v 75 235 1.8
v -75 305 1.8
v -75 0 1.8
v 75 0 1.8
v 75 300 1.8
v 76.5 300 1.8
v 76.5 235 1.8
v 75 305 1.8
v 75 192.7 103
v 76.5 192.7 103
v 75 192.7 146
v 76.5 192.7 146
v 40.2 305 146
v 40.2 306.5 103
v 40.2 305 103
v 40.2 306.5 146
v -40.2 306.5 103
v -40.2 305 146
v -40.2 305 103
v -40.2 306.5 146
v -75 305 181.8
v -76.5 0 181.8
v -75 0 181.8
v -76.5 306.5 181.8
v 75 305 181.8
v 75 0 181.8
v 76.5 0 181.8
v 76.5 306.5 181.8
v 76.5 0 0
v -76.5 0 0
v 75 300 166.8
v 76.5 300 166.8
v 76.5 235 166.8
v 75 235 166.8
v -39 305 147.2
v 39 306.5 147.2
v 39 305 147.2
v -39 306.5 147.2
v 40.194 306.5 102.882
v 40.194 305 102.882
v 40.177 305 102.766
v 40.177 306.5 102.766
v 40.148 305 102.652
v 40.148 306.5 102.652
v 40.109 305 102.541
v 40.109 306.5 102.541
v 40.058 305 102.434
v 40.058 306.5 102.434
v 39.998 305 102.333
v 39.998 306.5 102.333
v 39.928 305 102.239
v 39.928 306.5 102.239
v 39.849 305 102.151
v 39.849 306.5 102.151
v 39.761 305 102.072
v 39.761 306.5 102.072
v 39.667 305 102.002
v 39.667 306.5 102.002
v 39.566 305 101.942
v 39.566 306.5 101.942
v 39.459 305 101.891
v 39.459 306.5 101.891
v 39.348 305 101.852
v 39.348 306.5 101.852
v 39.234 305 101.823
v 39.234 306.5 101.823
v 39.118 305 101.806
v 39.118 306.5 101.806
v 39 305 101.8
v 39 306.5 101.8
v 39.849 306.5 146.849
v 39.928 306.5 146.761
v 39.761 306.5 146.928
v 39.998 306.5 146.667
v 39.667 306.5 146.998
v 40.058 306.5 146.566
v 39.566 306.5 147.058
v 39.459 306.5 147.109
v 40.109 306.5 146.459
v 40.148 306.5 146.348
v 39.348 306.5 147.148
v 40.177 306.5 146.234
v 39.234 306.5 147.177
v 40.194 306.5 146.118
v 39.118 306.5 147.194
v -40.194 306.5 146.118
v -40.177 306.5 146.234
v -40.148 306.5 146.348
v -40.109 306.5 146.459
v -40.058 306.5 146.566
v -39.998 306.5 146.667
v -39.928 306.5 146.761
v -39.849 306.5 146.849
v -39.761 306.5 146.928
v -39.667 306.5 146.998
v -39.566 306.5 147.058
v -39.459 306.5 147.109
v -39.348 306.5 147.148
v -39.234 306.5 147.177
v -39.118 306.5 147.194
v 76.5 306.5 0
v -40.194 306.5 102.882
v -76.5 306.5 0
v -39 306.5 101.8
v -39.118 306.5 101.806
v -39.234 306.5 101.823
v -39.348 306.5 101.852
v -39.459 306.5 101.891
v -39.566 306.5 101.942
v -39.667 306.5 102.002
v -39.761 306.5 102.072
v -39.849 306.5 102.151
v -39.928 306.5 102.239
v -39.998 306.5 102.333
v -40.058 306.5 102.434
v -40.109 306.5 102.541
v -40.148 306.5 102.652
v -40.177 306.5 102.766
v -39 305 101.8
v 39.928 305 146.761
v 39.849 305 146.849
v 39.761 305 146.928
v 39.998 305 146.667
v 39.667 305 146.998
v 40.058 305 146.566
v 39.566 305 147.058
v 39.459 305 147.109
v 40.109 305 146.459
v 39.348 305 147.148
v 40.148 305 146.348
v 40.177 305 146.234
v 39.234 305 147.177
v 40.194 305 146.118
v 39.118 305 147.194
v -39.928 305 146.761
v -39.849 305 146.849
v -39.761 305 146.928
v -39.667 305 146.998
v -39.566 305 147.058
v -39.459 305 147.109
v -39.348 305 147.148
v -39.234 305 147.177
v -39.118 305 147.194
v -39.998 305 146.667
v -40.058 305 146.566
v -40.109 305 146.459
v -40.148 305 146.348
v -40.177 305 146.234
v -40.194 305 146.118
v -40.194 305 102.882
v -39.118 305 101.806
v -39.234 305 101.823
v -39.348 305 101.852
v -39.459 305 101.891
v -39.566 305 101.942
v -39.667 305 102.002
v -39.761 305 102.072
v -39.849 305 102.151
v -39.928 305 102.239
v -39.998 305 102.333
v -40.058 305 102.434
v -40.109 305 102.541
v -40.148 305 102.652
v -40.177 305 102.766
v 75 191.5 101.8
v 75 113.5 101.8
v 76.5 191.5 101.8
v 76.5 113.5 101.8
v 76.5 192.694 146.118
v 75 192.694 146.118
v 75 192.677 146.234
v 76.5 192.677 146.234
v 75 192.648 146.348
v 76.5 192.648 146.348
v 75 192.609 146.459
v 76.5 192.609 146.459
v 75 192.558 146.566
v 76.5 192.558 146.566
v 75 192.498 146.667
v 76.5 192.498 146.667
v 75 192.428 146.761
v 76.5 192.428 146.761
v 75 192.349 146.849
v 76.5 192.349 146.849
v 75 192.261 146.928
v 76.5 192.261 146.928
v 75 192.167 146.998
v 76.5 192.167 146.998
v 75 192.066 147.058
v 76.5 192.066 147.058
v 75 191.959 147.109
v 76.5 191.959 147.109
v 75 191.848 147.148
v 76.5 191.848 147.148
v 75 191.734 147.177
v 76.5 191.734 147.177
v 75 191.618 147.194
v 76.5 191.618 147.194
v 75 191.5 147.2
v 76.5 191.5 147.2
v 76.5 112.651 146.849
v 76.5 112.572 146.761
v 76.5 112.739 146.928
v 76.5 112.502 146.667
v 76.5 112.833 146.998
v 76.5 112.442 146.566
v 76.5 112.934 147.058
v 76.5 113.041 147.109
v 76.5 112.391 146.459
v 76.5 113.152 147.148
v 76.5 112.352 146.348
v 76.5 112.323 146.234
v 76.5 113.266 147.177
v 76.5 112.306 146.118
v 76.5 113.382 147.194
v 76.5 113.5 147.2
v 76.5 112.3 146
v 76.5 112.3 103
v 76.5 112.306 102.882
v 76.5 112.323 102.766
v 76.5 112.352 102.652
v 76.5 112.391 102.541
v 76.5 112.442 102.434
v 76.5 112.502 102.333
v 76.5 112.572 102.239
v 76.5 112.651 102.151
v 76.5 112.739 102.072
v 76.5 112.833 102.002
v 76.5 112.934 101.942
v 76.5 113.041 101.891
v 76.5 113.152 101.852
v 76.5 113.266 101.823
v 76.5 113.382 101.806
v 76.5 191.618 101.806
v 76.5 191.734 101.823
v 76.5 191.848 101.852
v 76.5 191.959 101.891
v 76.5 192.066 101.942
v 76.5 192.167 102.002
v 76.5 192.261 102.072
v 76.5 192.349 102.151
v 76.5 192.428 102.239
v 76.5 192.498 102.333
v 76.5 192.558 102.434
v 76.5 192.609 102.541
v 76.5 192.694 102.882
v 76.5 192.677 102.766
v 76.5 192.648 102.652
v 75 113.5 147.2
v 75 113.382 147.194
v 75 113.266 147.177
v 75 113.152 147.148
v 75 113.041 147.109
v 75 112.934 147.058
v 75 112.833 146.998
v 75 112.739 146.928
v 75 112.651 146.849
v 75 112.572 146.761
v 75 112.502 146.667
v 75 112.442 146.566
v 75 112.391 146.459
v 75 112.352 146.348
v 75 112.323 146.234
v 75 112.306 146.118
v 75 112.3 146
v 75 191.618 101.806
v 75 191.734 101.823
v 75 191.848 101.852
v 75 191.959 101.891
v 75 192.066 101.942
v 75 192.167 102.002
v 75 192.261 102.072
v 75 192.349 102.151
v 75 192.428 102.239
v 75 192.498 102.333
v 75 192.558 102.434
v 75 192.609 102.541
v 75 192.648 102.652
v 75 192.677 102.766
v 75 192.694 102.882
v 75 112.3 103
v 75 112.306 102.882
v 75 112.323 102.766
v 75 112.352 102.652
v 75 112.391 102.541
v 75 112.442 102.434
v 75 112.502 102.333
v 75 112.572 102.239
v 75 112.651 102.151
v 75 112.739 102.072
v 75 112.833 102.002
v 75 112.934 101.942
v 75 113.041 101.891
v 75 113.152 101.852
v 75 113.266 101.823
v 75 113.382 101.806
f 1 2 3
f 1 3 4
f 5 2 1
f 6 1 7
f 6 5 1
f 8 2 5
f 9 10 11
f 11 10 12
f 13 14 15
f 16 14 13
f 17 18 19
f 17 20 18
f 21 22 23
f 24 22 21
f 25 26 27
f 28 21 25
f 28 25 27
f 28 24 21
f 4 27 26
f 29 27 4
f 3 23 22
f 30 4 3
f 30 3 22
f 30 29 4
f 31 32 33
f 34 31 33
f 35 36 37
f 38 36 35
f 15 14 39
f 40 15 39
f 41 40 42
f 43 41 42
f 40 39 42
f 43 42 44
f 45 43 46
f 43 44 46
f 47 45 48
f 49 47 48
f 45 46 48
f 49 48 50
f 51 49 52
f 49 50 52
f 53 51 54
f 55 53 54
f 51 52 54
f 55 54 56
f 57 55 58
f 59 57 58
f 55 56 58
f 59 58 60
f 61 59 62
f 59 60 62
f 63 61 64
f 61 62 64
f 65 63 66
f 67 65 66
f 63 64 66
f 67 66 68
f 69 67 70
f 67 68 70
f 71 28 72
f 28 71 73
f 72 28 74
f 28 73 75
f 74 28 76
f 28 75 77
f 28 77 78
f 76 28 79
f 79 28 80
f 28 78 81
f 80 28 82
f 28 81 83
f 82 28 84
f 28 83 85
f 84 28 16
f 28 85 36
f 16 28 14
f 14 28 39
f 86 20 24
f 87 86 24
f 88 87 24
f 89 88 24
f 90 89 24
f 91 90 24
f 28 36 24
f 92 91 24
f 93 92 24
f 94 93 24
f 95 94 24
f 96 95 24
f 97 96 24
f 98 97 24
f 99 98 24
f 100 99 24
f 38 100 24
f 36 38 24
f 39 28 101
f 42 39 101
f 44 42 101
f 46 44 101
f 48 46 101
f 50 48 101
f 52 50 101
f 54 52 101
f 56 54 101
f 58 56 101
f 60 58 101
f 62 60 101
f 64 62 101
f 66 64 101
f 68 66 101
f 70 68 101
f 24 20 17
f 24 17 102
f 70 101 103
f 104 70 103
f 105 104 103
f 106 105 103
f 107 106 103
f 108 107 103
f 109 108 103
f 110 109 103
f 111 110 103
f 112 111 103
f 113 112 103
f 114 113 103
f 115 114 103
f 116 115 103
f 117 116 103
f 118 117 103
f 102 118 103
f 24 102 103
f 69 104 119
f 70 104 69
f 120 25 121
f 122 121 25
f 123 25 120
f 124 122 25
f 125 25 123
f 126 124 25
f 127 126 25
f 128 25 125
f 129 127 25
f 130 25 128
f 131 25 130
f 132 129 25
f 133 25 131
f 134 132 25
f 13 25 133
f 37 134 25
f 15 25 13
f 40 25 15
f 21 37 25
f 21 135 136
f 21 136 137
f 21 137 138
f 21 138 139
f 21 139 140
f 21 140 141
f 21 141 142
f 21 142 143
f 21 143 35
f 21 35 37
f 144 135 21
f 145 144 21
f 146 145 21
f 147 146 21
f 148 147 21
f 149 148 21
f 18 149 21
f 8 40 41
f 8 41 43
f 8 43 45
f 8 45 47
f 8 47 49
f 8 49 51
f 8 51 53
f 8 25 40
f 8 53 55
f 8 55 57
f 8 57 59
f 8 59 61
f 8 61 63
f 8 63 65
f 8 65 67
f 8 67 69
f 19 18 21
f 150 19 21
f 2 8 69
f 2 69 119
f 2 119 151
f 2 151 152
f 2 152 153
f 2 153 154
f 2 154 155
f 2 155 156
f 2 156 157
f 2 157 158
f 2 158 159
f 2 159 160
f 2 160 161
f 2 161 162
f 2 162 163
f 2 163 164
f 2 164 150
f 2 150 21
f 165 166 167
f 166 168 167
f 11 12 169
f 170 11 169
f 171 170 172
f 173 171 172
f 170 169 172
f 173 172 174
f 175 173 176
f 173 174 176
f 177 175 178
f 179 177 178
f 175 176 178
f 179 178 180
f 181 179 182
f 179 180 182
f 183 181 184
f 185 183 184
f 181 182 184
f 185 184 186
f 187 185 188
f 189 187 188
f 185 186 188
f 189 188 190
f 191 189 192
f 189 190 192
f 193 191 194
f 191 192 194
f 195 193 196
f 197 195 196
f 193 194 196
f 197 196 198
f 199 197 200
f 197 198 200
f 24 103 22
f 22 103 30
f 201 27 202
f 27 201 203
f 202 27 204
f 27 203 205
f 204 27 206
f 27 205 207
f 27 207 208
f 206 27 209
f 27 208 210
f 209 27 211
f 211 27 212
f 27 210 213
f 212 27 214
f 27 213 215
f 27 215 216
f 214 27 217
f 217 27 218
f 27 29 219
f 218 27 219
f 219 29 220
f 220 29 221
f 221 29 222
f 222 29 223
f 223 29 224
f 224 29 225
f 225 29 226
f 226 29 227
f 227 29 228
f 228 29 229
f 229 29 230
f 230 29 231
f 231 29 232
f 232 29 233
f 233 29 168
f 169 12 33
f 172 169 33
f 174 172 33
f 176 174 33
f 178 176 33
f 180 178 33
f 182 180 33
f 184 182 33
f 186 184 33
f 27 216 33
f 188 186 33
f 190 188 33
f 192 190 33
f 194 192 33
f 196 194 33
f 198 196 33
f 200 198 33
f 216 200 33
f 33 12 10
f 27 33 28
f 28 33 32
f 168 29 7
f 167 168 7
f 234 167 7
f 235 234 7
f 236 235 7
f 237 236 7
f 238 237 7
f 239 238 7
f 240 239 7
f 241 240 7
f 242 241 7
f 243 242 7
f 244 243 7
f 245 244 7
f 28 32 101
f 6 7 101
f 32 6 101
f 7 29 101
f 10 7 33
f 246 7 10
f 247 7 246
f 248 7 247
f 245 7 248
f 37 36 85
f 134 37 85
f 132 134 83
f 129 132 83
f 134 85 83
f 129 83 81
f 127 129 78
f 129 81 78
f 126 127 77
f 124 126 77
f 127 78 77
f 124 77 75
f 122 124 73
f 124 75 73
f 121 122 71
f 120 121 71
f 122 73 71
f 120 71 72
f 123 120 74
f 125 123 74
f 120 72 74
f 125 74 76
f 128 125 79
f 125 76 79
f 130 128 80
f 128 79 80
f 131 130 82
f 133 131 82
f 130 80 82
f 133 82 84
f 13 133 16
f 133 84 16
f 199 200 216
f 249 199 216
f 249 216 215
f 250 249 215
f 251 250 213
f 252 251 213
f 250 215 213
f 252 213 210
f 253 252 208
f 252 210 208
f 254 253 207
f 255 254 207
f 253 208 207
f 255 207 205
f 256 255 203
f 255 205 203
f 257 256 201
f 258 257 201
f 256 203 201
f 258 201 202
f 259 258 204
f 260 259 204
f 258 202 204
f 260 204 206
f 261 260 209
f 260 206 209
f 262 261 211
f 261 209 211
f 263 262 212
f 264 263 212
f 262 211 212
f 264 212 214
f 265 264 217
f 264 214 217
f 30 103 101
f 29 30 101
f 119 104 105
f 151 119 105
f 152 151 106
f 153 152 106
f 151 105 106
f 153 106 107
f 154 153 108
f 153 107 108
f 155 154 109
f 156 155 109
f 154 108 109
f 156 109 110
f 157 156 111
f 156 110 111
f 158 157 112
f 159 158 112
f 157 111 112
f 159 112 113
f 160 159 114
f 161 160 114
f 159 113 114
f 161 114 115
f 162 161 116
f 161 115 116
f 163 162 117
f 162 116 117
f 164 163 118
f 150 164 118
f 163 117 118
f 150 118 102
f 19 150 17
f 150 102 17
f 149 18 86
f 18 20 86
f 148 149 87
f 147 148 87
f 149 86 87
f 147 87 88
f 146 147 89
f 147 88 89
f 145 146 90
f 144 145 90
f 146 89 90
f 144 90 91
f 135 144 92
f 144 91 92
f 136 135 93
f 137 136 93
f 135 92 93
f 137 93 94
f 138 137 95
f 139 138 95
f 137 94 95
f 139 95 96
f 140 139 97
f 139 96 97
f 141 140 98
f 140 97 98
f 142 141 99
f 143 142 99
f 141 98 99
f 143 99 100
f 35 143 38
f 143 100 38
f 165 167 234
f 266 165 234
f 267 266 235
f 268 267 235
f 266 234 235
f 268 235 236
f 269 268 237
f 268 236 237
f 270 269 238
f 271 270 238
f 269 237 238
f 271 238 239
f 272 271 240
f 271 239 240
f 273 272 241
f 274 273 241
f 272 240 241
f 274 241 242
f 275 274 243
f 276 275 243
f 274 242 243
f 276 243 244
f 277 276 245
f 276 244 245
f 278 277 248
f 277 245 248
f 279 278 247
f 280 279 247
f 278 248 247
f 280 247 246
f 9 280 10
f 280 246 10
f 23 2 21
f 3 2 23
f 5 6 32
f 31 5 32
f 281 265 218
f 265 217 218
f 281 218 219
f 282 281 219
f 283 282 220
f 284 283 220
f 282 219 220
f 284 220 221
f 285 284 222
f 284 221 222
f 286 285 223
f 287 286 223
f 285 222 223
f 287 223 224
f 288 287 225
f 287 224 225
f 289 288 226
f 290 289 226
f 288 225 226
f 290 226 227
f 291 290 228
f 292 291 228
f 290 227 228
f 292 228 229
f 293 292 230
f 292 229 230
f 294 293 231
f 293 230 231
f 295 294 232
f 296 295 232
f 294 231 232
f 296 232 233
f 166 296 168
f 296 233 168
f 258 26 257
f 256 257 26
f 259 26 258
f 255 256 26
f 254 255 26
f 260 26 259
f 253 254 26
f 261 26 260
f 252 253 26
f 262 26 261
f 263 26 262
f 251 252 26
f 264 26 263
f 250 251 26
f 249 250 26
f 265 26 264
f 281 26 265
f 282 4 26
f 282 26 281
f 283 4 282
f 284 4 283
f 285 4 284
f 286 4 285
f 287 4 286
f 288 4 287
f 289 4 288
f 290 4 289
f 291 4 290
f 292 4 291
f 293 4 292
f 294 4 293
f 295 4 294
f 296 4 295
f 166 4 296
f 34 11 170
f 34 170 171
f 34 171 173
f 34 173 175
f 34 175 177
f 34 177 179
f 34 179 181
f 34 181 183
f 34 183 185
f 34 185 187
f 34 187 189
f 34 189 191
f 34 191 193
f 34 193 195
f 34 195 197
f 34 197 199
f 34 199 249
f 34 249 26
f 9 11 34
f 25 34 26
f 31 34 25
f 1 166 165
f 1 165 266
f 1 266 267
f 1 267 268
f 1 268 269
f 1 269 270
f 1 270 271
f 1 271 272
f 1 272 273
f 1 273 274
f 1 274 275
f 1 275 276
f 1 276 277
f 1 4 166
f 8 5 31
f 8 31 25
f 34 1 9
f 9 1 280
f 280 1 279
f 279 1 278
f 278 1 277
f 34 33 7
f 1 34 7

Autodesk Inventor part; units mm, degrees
ref_plane "YZ Plane" through (0, 0, 0) normal (1, 0, 0) x (0, 1, 0)
ref_plane "XZ Plane" through (0, 0, 0) normal (0, 1, 0) x (-1, 0, 0)
ref_plane "XY Plane" through (0, 0, 0) normal (0, 0, 1) x (1, 0, 0)
sketch "Skizze1" plane through (0, 0, 0) normal (0, 0, 1) x (1, 0, 0)
  line L0 (-76.5, 0) -> (76.5, 0)
  line L1 (76.5, 0) -> (76.5, 306.5)
  line L2 (76.5, 306.5) -> (-76.5, 306.5)
  line L3 (-76.5, 306.5) -> (-76.5, 0)
  line L4 (75, 306.5) -> (75, 0) construction
  line L5 (-75, 0) -> (-75, 306.5) construction
  line L6 (-76.5, 305) -> (76.5, 305) construction
  point P0 (0, 0)
  point P1 (0, 0)
  point P2 (-75, 305)
  point P3 (75, 305)
  dimension "d2" = 1.5
  dimension "d3" = 1.5
  dimension "d4" = 1.5
  dimension "d5" = 150
  dimension "d6" = 305
extrude "Bodenplatte" add sketch "Skizze1" along normal blind 1.8
sketch "Skizze3" plane through (0, 0, 1.8) normal (0, 0, 1) x (1, 0, 0)
  line L0 (-76.5, 306.5) -> (-76.5, 0) projected
  line L1 (-76.5, 0) -> (76.5, 0) projected
  line L2 (-76.5, 306.5) -> (-75, 306.5)
  line L3 (-75, 306.5) -> (-75, 0)
  line L4 (-75, 0) -> (-76.5, 0)
  line L5 (-76.5, 0) -> (-76.5, 306.5)
  point P0 (0, 0)
  dimension "d9" = 1.5
extrude "Wand_links" add sketch "Skizze3" along normal blind 180
sketch "Skizze4" plane through (0, 0, 1.8) normal (0, 0, 1) x (1, 0, 0)
  line L0 (76.5, 0) -> (76.5, 306.5) projected
  line L1 (76.5, 0) -> (75, 0)
  line L2 (75, 0) -> (75, 306.5)
  line L3 (75, 306.5) -> (76.5, 306.5)
  line L4 (76.5, 306.5) -> (76.5, 0)
  point P0 (0, 0)
  dimension "d12" = 1.5
extrude "Wand_rechts" add sketch "Skizze4" along normal blind 180
sketch "Skizze5" plane through (0, 0, 1.8) normal (0, 0, 1) x (1, 0, 0)
  line L0 (75, 306.5) -> (-75, 306.5) projected
  line L1 (75, 306.5) -> (75, 0) projected
  line L2 (-75, 0) -> (-75, 306.5) projected
  line L3 (-75, 306.5) -> (-76.5, 306.5) projected
  line L4 (-75, 306.5) -> (75, 306.5)
  line L5 (75, 306.5) -> (75, 305)
  line L6 (75, 305) -> (-75, 305)
  line L7 (-75, 305) -> (-75, 306.5)
  point P0 (0, 0)
  dimension "d15" = 1.5
extrude "Wand_vorn" add sketch "Skizze5" along normal blind 180
sketch "Skizze6" plane through (-76.5, 306.5, 0) normal (0, 1, 0) x (1, 0, 0)
  line L0 (153, 0) -> (0, 0) construction
  line L1 (0, 0) -> (0, -181.8) construction
  line L2 (153, -181.8) -> (0, -181.8) construction
  line L3 (153, 0) -> (153, -181.8) construction
  line L4 (115.5, -147.2) -> (37.5, -147.2)
  line L5 (36.3, -146) -> (36.3, -103)
  line L6 (37.5, -101.8) -> (115.5, -101.8)
  line L7 (116.7, -103) -> (116.7, -146)
  line L8 (76.5, 0) -> (76.5, -181.8) construction
  line L9 (153, 0) -> (153, -181.8) construction
  line L10 (151.5, -1.8) -> (1.5, -1.8) construction
  arc A0 (115.5, -147.2) -> (116.7, -146) centre (115.5, -146) ccw
  arc A1 (36.3, -146) -> (37.5, -147.2) centre (37.5, -146) ccw
  arc A2 (37.5, -101.8) -> (36.3, -103) centre (37.5, -103) ccw
  arc A3 (116.7, -103) -> (115.5, -101.8) centre (115.5, -103) ccw
  point P0 (116.7, -147.2)
  point P1 (36.3, -101.8)
  point P2 (36.3, -147.2)
  point P3 (116.7, -101.8)
  point P4 (76.5, -147.2)
  dimension "d18" = 80.4
  dimension "d19" = 45.4
  dimension "d25" = 100
  dimension "d35" = 1.2
extrude "Fenster_vorn" cut sketch "Skizze6" against normal up to next
sketch "Skizze7" plane through (76.5, 0, 0) normal (1, 0, 0) x (0, 0, -1)
  line L0 (-1.8, 0) -> (-1.8, 305) construction
  line L1 (-181.8, 305) -> (-1.8, 305) construction
  line L2 (-146, 112.3) -> (-103, 112.3)
  line L3 (-101.8, 113.5) -> (-101.8, 191.5)
  line L4 (-103, 192.7) -> (-146, 192.7)
  line L5 (-147.2, 191.5) -> (-147.2, 113.5)
  arc A0 (-147.2, 113.5) -> (-146, 112.3) centre (-146, 113.5) ccw
  arc A1 (-146, 192.7) -> (-147.2, 191.5) centre (-146, 191.5) ccw
  arc A2 (-101.8, 191.5) -> (-103, 192.7) centre (-103, 191.5) ccw
  arc A3 (-103, 112.3) -> (-101.8, 113.5) centre (-103, 113.5) ccw
  line L6 (-1.8, 152.5) -> (-181.8, 152.5) construction
  line L7 (-181.8, 0) -> (-181.8, 305) construction
  point P0 (0, 0)
  point P1 (-101.8, 192.7)
  point P2 (-101.8, 112.3)
  point P3 (-147.2, 192.7)
  point P4 (-147.2, 152.5)
  dimension "d26" = 45.4
  dimension "d27" = 80.4
  dimension "d28" = 1.2
  dimension "d29" = 1.2
  dimension "d30" = 1.2
  dimension "d31" = 1.2
  dimension "d34" = 100
extrude "Fenster_rechts" cut sketch "Skizze7" against normal blind 10
sketch "Skizze8" plane through (76.5, 0, 0) normal (1, 0, 0) x (0, 0, -1)
  line L0 (-181.8, 305) -> (-1.8, 305) construction
  line L1 (-1.8, 0) -> (-1.8, 305) construction
  line L2 (-166.8, 235) -> (-1.8, 235)
  line L3 (-1.8, 235) -> (-1.8, 300)
  line L4 (-1.8, 300) -> (-166.8, 300)
  line L5 (-166.8, 300) -> (-166.8, 235)
  point P0 (0, 0)
  dimension "d36" = 65
  dimension "d37" = 165
  dimension "d38" = 5
extrude "Tuer_rechts" cut sketch "Skizze8" against normal blind 10
properties part number "Koffer_leer"
